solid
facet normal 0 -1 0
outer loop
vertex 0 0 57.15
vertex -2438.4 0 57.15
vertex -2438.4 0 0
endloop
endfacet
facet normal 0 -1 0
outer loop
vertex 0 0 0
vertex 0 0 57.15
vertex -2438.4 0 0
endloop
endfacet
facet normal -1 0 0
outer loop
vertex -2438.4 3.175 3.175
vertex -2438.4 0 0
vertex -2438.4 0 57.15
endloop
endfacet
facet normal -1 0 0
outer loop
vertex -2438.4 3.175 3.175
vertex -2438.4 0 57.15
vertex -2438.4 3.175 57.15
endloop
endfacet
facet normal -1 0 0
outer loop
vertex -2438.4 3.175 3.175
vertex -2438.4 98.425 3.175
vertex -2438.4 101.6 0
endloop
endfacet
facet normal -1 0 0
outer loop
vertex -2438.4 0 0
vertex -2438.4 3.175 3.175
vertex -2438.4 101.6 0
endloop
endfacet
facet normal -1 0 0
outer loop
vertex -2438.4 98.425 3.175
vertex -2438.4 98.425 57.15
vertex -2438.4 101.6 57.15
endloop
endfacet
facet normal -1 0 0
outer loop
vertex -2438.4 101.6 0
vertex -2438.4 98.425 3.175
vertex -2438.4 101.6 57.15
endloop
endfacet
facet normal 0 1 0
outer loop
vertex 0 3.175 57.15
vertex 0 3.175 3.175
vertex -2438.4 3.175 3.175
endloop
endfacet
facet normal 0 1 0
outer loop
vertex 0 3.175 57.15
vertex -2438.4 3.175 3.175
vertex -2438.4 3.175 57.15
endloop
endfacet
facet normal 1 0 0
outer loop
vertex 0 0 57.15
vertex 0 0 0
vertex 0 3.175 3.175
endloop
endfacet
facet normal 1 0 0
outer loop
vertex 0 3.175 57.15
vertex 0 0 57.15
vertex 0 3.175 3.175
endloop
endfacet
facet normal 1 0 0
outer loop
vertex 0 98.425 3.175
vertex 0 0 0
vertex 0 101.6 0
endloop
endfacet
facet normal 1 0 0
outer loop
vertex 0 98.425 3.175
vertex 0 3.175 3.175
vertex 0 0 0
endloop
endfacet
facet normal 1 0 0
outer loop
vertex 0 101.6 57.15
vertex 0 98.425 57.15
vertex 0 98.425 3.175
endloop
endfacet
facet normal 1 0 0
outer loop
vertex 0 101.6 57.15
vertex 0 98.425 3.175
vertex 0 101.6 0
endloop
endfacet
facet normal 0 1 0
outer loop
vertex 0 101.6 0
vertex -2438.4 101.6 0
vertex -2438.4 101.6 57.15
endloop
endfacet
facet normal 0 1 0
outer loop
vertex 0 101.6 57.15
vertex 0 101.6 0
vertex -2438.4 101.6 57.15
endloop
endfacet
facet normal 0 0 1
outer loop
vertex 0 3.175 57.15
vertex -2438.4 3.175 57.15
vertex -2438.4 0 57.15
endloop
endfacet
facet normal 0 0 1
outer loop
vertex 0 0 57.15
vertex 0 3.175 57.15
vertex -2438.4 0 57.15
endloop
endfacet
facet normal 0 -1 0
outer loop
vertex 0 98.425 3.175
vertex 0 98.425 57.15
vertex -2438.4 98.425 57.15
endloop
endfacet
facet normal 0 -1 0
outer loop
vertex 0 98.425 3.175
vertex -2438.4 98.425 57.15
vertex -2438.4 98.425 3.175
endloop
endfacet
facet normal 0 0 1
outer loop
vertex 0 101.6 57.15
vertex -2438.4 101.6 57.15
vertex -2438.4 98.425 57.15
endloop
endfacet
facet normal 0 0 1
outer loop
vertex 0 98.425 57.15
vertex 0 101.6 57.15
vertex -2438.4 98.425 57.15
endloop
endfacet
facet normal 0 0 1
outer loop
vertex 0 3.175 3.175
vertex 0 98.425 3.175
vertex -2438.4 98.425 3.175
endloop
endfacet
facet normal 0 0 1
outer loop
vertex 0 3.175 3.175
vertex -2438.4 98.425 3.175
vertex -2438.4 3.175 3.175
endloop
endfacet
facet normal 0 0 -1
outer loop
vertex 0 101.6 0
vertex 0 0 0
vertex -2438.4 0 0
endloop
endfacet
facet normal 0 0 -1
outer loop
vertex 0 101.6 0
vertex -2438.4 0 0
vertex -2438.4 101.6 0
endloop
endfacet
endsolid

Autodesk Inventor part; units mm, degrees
ref_plane "YZ Plane" through (0, 0, 0) normal (1, 0, 0) x (0, 1, 0)
ref_plane "XZ Plane" through (0, 0, 0) normal (0, 1, 0) x (-1, 0, 0)
ref_plane "XY Plane" through (0, 0, 0) normal (0, 0, 1) x (1, 0, 0)
sketch "Sketch1" plane through (0, 0, 0) normal (1, 0, 0) x (0, 1, 0)
  line L0 (0, 0) -> (101.6, 0)
  line L1 (101.6, 0) -> (101.6, 57.15)
  line L2 (0, 57.15) -> (0, 0)
  line L3 (98.425, 57.15) -> (98.425, 3.175)
  line L4 (98.425, 3.175) -> (3.175, 3.175)
  line L5 (3.175, 3.175) -> (3.175, 57.15)
  line L6 (101.6, 57.15) -> (98.425, 57.15)
  line L7 (3.175, 57.15) -> (0, 57.15)
  dimension "d0" = 101.6
  dimension "d1" = 57.15
  dimension "d2" = 3.175
extrude "Extrusion1" add sketch "Sketch1" against normal blind 2438.4
properties part number "channel2.25x4" material "Aluminum 6061"
